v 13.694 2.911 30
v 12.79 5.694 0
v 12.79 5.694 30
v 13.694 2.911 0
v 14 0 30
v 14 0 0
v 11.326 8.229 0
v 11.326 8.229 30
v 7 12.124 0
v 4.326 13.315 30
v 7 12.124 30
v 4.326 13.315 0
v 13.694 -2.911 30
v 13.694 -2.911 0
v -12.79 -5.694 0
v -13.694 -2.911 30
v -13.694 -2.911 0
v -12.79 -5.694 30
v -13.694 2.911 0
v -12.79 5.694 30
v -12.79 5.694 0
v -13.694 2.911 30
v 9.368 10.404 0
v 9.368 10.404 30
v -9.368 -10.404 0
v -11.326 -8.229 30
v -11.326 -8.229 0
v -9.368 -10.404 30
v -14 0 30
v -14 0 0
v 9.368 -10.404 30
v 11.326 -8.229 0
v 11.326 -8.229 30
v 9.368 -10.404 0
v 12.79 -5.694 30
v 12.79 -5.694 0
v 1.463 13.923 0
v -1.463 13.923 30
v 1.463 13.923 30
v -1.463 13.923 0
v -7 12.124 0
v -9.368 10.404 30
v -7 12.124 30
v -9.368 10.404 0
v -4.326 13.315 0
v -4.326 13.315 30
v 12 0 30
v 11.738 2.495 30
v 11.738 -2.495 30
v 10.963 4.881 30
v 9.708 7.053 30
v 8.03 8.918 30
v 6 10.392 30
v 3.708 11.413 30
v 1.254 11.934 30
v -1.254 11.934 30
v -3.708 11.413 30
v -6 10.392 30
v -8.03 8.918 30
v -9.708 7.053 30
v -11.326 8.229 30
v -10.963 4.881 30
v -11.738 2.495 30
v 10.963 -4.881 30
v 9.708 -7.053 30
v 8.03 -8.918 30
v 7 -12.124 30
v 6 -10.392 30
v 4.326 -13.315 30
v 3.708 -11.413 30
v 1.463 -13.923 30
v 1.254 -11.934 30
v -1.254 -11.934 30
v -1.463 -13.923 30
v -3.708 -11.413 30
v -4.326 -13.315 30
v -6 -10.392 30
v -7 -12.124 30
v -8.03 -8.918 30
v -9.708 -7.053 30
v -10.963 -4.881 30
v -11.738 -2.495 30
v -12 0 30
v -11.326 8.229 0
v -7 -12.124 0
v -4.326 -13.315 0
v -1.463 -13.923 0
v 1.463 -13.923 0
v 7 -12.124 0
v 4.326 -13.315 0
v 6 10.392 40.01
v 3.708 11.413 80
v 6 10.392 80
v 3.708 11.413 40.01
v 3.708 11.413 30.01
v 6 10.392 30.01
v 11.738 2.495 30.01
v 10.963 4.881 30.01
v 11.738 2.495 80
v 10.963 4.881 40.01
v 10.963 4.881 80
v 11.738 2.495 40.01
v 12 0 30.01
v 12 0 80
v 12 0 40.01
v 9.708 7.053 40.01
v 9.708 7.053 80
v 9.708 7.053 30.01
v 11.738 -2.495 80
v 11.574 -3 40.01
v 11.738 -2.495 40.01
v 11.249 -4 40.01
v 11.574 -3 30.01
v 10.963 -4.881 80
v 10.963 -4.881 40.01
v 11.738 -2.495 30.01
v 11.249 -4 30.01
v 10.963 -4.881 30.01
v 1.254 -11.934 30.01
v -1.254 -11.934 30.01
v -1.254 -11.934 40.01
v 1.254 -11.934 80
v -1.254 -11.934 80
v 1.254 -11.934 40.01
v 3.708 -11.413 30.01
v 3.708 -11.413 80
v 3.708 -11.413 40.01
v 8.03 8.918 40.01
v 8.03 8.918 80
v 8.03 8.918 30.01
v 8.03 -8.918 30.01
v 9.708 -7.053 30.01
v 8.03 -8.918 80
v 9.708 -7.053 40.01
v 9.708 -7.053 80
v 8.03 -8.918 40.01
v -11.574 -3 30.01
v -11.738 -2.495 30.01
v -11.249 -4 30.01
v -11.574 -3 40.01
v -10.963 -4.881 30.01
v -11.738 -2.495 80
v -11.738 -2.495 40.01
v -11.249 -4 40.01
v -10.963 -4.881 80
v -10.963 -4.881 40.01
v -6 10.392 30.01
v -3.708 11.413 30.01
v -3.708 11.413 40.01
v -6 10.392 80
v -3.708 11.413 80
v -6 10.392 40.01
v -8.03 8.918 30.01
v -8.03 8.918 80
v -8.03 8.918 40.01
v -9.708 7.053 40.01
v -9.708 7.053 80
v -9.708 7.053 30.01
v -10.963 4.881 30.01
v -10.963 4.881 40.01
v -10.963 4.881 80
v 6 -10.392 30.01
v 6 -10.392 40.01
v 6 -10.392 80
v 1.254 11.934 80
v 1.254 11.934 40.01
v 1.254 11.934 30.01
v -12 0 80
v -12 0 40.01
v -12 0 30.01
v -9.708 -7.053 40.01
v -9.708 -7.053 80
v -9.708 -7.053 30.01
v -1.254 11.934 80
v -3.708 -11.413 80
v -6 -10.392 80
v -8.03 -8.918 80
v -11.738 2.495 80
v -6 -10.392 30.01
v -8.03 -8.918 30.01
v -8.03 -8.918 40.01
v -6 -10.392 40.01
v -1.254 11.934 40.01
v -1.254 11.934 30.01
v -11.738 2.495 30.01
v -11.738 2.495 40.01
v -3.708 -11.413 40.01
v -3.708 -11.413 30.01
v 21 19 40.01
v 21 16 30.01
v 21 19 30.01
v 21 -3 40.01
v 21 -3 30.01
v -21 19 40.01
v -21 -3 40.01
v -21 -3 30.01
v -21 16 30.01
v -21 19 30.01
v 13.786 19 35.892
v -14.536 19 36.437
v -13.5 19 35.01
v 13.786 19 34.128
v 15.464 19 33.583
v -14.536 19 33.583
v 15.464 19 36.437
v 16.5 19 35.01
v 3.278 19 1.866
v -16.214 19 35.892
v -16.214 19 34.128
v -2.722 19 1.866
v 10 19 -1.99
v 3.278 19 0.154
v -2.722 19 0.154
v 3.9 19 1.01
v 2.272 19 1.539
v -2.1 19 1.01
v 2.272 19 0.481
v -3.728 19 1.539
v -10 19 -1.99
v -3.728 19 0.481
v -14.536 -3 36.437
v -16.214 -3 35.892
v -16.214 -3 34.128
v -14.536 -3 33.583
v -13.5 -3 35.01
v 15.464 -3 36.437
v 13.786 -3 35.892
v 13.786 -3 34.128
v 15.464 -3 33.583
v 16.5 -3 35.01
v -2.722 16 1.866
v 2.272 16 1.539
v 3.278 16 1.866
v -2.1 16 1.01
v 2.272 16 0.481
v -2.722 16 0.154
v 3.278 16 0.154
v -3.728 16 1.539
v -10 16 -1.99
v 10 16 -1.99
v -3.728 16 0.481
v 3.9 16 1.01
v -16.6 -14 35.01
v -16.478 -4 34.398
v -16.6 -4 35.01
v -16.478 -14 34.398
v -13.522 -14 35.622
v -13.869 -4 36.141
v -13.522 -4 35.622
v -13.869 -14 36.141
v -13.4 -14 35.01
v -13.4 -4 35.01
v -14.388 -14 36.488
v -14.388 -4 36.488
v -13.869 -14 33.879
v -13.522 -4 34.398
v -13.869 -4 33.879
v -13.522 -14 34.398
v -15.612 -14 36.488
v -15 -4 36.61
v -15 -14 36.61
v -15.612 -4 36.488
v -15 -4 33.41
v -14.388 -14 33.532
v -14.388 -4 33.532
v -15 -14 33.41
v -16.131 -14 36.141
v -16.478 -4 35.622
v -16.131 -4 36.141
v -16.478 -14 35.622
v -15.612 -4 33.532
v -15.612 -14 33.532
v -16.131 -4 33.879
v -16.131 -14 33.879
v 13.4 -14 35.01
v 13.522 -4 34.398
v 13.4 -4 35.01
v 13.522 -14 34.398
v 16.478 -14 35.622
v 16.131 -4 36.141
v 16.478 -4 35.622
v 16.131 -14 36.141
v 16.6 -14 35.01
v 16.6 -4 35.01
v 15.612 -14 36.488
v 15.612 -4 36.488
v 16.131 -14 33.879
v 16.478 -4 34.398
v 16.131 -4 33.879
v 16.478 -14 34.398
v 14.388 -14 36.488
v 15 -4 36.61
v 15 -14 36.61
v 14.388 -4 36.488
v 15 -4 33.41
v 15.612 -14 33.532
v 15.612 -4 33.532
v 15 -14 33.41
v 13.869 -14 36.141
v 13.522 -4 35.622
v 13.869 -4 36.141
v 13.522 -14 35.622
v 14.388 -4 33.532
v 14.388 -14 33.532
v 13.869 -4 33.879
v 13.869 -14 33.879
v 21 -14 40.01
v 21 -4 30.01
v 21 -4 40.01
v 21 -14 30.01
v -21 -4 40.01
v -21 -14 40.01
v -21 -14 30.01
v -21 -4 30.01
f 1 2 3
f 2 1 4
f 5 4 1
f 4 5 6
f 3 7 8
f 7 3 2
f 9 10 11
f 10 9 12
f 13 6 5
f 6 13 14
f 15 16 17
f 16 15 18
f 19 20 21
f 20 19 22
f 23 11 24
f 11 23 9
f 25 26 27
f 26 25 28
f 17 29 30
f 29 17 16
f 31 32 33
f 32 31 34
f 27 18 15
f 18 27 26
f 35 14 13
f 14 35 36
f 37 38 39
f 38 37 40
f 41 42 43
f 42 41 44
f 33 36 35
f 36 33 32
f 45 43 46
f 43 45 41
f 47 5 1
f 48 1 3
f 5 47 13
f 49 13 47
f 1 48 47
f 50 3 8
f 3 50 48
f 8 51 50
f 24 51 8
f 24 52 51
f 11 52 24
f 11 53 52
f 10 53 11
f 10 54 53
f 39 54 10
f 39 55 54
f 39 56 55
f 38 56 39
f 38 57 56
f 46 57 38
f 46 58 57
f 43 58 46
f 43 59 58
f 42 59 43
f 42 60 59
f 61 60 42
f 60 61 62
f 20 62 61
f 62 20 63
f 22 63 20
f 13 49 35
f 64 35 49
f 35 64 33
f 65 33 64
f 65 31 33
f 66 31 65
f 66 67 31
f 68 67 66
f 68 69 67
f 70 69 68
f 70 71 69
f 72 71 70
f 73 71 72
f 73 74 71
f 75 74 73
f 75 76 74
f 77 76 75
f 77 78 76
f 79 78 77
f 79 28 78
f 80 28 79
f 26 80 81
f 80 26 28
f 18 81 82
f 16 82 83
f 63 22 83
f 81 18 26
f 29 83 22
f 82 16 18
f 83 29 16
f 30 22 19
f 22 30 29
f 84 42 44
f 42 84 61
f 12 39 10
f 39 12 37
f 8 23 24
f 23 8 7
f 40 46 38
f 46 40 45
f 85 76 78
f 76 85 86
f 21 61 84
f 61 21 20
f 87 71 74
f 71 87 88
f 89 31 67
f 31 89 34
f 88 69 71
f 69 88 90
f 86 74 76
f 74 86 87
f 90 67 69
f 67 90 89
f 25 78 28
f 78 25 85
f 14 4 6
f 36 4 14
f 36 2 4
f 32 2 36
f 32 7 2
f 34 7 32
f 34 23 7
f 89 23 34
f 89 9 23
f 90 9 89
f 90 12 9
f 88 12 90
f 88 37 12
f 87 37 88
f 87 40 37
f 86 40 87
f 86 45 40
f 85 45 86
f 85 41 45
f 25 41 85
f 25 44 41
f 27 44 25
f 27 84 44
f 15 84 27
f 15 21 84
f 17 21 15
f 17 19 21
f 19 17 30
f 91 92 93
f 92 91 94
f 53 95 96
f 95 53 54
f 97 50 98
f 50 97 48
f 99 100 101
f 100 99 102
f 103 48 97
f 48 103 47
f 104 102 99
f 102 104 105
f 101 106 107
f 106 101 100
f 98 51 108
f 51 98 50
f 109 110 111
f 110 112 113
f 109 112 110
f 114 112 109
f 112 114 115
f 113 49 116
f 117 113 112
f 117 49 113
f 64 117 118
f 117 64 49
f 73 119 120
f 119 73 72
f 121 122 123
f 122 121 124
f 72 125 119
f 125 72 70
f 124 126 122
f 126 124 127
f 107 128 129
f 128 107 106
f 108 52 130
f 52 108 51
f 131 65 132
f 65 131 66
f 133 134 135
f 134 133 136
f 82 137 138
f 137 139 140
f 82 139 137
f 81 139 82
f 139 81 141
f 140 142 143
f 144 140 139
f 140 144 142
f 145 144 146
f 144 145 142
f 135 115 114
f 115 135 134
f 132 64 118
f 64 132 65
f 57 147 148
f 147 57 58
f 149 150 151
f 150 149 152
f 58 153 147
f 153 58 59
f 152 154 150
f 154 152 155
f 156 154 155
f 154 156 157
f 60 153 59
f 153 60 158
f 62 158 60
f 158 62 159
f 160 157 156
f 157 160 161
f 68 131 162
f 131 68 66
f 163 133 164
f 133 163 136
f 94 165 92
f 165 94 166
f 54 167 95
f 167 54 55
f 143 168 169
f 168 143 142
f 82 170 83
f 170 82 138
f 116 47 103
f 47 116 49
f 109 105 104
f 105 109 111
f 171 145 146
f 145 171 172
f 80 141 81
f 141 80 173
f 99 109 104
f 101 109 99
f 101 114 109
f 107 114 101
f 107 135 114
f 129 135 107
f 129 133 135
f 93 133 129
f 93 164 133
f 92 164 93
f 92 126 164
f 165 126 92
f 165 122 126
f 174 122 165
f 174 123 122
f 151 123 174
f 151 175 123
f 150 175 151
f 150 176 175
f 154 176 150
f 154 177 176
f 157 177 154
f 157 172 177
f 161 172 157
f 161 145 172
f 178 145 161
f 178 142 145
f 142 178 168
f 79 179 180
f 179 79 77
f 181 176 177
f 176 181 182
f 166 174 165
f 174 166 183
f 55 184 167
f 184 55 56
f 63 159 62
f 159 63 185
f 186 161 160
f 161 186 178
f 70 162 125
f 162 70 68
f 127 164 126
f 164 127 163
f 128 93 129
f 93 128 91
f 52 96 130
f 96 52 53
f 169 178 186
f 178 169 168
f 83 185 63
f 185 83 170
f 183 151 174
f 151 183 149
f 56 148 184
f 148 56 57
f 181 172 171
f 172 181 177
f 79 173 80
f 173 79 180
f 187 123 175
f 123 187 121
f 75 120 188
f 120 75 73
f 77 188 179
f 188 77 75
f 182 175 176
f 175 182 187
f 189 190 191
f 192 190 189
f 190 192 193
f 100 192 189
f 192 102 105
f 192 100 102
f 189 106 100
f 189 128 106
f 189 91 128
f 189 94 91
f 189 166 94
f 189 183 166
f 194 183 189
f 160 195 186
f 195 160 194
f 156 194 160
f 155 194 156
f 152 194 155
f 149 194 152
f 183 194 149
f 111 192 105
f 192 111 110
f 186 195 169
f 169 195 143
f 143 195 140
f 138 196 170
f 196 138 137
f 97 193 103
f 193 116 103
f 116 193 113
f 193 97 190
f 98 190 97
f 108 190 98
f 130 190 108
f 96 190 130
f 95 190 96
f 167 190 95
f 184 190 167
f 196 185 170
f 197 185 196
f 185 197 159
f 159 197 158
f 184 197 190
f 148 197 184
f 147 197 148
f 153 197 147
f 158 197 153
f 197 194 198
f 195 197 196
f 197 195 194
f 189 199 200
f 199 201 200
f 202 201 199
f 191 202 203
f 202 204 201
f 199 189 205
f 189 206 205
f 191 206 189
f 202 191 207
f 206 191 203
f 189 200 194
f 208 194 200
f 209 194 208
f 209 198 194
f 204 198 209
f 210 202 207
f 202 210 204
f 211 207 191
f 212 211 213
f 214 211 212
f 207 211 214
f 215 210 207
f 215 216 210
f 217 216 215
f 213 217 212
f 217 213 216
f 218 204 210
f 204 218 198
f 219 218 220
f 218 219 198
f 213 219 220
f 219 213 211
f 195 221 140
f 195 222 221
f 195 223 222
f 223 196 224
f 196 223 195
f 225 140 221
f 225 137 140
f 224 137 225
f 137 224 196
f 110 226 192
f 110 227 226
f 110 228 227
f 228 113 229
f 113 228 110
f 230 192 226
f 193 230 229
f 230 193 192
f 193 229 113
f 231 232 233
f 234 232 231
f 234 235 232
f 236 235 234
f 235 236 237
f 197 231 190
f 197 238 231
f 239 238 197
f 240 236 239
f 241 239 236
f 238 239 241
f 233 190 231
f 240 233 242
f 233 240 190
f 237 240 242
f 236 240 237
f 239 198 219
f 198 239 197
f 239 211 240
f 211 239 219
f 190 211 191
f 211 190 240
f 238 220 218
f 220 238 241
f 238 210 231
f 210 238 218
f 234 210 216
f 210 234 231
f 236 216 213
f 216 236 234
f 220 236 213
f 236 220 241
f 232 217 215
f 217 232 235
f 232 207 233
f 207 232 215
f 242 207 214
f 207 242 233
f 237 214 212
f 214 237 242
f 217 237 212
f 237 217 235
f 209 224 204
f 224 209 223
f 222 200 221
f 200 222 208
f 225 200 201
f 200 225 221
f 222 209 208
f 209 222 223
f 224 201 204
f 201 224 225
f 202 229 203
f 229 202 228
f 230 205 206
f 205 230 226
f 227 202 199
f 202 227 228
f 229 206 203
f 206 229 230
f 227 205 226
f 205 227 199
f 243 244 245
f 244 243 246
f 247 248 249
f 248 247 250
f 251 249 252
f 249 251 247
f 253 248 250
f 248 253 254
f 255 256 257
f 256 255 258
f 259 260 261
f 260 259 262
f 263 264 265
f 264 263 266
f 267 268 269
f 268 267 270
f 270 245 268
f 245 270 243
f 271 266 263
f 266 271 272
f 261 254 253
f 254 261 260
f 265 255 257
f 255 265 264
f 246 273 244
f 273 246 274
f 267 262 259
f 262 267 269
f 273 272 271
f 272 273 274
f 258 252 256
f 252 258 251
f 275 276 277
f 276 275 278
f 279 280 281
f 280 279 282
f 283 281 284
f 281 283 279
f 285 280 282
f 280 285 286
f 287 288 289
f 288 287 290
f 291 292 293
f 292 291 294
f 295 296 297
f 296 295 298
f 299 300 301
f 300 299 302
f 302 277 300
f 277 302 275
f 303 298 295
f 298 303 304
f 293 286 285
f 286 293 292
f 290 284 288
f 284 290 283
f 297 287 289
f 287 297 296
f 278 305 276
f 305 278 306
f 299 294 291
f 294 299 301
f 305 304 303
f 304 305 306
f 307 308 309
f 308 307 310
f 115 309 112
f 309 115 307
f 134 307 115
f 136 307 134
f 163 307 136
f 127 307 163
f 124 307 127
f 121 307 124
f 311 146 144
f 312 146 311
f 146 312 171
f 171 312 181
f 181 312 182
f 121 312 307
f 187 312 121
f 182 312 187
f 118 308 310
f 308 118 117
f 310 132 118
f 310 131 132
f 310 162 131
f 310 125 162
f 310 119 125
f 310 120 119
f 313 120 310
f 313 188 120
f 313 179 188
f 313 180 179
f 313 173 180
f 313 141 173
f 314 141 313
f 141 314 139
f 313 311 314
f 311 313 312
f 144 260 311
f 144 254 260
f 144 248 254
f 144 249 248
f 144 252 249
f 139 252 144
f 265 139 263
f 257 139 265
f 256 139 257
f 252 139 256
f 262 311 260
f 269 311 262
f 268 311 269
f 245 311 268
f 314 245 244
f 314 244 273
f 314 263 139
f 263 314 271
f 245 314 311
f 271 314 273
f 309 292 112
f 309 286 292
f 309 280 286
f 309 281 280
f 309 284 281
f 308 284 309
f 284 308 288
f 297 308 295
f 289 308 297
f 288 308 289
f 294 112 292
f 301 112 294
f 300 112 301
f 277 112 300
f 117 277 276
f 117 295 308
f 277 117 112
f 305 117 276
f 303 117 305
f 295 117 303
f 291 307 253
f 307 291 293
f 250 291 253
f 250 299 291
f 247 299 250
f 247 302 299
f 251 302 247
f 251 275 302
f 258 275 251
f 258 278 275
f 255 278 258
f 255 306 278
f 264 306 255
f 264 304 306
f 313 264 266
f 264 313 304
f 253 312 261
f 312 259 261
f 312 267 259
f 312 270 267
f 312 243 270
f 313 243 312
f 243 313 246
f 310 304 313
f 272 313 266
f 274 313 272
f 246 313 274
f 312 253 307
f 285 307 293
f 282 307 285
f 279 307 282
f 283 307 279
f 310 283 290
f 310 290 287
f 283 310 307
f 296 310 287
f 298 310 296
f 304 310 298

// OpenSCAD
bottom_height = 30;
magic_1 = 32;

// An approximation of the head/lens assembly that the mount must attach to.
module LensAssembly() {
  color("gray") {
    cylinder(h = bottom_height, d = 28);

    translate([0, 0, bottom_height]) {
      cylinder(h = 50, d = 24);
    }
  }
}

module MountScrews() {
  for(x = [-15, 15]) {
    translate([x, 0, 5]) {
      rotate([90, 0, 0]) {
        children();
      }
    }
  }
}

mount_width = 42;

module MainMount() {
  color("blue") {
    difference() {
      translate([0, 0, bottom_height + 0.01]) {
        difference() {
          union() {
            translate([-mount_width/2, -3, 0]) {
              cube([mount_width, 22, 10]);
            }

            translate([0, 19, -magic_1/2]) {
              rotate([90, 0, 0]) {
                linear_extrude(3) {
                  difference() {
                    union() {
                      polygon(points=[
                        [-mount_width/2, magic_1/2],
                        [mount_width/2, magic_1/2],
                        [10, -magic_1/2],
                        [-10, -magic_1/2],
                      ]);
                    }

                    for(x = [-3, 3]) {
                      translate([x, -(magic_1/2)+3, 0]) {
                        circle(d = 1.8, $fn = 5);
                      }
                    }
                  }
                }
              }
            }
          }

          MountScrews() {
            cylinder(d = 3, h = 100, center = true, $fn = 5);
          }
        }
      }

      LensAssembly();
    }
  }
}

module MountClamp() {
  color("green") {
    difference() {
      translate([0, 0, bottom_height + 0.01]) {
        difference() {
          translate([-mount_width/2, -14, 0]) {
            cube([mount_width, 10, 10]);
          }

          MountScrews() {
            cylinder(d = 3.2, h = 100, center = true, $fn = 16);
          }
        }
      }

      LensAssembly();
    }
  }
}

#LensAssembly();
MainMount();
MountClamp();
